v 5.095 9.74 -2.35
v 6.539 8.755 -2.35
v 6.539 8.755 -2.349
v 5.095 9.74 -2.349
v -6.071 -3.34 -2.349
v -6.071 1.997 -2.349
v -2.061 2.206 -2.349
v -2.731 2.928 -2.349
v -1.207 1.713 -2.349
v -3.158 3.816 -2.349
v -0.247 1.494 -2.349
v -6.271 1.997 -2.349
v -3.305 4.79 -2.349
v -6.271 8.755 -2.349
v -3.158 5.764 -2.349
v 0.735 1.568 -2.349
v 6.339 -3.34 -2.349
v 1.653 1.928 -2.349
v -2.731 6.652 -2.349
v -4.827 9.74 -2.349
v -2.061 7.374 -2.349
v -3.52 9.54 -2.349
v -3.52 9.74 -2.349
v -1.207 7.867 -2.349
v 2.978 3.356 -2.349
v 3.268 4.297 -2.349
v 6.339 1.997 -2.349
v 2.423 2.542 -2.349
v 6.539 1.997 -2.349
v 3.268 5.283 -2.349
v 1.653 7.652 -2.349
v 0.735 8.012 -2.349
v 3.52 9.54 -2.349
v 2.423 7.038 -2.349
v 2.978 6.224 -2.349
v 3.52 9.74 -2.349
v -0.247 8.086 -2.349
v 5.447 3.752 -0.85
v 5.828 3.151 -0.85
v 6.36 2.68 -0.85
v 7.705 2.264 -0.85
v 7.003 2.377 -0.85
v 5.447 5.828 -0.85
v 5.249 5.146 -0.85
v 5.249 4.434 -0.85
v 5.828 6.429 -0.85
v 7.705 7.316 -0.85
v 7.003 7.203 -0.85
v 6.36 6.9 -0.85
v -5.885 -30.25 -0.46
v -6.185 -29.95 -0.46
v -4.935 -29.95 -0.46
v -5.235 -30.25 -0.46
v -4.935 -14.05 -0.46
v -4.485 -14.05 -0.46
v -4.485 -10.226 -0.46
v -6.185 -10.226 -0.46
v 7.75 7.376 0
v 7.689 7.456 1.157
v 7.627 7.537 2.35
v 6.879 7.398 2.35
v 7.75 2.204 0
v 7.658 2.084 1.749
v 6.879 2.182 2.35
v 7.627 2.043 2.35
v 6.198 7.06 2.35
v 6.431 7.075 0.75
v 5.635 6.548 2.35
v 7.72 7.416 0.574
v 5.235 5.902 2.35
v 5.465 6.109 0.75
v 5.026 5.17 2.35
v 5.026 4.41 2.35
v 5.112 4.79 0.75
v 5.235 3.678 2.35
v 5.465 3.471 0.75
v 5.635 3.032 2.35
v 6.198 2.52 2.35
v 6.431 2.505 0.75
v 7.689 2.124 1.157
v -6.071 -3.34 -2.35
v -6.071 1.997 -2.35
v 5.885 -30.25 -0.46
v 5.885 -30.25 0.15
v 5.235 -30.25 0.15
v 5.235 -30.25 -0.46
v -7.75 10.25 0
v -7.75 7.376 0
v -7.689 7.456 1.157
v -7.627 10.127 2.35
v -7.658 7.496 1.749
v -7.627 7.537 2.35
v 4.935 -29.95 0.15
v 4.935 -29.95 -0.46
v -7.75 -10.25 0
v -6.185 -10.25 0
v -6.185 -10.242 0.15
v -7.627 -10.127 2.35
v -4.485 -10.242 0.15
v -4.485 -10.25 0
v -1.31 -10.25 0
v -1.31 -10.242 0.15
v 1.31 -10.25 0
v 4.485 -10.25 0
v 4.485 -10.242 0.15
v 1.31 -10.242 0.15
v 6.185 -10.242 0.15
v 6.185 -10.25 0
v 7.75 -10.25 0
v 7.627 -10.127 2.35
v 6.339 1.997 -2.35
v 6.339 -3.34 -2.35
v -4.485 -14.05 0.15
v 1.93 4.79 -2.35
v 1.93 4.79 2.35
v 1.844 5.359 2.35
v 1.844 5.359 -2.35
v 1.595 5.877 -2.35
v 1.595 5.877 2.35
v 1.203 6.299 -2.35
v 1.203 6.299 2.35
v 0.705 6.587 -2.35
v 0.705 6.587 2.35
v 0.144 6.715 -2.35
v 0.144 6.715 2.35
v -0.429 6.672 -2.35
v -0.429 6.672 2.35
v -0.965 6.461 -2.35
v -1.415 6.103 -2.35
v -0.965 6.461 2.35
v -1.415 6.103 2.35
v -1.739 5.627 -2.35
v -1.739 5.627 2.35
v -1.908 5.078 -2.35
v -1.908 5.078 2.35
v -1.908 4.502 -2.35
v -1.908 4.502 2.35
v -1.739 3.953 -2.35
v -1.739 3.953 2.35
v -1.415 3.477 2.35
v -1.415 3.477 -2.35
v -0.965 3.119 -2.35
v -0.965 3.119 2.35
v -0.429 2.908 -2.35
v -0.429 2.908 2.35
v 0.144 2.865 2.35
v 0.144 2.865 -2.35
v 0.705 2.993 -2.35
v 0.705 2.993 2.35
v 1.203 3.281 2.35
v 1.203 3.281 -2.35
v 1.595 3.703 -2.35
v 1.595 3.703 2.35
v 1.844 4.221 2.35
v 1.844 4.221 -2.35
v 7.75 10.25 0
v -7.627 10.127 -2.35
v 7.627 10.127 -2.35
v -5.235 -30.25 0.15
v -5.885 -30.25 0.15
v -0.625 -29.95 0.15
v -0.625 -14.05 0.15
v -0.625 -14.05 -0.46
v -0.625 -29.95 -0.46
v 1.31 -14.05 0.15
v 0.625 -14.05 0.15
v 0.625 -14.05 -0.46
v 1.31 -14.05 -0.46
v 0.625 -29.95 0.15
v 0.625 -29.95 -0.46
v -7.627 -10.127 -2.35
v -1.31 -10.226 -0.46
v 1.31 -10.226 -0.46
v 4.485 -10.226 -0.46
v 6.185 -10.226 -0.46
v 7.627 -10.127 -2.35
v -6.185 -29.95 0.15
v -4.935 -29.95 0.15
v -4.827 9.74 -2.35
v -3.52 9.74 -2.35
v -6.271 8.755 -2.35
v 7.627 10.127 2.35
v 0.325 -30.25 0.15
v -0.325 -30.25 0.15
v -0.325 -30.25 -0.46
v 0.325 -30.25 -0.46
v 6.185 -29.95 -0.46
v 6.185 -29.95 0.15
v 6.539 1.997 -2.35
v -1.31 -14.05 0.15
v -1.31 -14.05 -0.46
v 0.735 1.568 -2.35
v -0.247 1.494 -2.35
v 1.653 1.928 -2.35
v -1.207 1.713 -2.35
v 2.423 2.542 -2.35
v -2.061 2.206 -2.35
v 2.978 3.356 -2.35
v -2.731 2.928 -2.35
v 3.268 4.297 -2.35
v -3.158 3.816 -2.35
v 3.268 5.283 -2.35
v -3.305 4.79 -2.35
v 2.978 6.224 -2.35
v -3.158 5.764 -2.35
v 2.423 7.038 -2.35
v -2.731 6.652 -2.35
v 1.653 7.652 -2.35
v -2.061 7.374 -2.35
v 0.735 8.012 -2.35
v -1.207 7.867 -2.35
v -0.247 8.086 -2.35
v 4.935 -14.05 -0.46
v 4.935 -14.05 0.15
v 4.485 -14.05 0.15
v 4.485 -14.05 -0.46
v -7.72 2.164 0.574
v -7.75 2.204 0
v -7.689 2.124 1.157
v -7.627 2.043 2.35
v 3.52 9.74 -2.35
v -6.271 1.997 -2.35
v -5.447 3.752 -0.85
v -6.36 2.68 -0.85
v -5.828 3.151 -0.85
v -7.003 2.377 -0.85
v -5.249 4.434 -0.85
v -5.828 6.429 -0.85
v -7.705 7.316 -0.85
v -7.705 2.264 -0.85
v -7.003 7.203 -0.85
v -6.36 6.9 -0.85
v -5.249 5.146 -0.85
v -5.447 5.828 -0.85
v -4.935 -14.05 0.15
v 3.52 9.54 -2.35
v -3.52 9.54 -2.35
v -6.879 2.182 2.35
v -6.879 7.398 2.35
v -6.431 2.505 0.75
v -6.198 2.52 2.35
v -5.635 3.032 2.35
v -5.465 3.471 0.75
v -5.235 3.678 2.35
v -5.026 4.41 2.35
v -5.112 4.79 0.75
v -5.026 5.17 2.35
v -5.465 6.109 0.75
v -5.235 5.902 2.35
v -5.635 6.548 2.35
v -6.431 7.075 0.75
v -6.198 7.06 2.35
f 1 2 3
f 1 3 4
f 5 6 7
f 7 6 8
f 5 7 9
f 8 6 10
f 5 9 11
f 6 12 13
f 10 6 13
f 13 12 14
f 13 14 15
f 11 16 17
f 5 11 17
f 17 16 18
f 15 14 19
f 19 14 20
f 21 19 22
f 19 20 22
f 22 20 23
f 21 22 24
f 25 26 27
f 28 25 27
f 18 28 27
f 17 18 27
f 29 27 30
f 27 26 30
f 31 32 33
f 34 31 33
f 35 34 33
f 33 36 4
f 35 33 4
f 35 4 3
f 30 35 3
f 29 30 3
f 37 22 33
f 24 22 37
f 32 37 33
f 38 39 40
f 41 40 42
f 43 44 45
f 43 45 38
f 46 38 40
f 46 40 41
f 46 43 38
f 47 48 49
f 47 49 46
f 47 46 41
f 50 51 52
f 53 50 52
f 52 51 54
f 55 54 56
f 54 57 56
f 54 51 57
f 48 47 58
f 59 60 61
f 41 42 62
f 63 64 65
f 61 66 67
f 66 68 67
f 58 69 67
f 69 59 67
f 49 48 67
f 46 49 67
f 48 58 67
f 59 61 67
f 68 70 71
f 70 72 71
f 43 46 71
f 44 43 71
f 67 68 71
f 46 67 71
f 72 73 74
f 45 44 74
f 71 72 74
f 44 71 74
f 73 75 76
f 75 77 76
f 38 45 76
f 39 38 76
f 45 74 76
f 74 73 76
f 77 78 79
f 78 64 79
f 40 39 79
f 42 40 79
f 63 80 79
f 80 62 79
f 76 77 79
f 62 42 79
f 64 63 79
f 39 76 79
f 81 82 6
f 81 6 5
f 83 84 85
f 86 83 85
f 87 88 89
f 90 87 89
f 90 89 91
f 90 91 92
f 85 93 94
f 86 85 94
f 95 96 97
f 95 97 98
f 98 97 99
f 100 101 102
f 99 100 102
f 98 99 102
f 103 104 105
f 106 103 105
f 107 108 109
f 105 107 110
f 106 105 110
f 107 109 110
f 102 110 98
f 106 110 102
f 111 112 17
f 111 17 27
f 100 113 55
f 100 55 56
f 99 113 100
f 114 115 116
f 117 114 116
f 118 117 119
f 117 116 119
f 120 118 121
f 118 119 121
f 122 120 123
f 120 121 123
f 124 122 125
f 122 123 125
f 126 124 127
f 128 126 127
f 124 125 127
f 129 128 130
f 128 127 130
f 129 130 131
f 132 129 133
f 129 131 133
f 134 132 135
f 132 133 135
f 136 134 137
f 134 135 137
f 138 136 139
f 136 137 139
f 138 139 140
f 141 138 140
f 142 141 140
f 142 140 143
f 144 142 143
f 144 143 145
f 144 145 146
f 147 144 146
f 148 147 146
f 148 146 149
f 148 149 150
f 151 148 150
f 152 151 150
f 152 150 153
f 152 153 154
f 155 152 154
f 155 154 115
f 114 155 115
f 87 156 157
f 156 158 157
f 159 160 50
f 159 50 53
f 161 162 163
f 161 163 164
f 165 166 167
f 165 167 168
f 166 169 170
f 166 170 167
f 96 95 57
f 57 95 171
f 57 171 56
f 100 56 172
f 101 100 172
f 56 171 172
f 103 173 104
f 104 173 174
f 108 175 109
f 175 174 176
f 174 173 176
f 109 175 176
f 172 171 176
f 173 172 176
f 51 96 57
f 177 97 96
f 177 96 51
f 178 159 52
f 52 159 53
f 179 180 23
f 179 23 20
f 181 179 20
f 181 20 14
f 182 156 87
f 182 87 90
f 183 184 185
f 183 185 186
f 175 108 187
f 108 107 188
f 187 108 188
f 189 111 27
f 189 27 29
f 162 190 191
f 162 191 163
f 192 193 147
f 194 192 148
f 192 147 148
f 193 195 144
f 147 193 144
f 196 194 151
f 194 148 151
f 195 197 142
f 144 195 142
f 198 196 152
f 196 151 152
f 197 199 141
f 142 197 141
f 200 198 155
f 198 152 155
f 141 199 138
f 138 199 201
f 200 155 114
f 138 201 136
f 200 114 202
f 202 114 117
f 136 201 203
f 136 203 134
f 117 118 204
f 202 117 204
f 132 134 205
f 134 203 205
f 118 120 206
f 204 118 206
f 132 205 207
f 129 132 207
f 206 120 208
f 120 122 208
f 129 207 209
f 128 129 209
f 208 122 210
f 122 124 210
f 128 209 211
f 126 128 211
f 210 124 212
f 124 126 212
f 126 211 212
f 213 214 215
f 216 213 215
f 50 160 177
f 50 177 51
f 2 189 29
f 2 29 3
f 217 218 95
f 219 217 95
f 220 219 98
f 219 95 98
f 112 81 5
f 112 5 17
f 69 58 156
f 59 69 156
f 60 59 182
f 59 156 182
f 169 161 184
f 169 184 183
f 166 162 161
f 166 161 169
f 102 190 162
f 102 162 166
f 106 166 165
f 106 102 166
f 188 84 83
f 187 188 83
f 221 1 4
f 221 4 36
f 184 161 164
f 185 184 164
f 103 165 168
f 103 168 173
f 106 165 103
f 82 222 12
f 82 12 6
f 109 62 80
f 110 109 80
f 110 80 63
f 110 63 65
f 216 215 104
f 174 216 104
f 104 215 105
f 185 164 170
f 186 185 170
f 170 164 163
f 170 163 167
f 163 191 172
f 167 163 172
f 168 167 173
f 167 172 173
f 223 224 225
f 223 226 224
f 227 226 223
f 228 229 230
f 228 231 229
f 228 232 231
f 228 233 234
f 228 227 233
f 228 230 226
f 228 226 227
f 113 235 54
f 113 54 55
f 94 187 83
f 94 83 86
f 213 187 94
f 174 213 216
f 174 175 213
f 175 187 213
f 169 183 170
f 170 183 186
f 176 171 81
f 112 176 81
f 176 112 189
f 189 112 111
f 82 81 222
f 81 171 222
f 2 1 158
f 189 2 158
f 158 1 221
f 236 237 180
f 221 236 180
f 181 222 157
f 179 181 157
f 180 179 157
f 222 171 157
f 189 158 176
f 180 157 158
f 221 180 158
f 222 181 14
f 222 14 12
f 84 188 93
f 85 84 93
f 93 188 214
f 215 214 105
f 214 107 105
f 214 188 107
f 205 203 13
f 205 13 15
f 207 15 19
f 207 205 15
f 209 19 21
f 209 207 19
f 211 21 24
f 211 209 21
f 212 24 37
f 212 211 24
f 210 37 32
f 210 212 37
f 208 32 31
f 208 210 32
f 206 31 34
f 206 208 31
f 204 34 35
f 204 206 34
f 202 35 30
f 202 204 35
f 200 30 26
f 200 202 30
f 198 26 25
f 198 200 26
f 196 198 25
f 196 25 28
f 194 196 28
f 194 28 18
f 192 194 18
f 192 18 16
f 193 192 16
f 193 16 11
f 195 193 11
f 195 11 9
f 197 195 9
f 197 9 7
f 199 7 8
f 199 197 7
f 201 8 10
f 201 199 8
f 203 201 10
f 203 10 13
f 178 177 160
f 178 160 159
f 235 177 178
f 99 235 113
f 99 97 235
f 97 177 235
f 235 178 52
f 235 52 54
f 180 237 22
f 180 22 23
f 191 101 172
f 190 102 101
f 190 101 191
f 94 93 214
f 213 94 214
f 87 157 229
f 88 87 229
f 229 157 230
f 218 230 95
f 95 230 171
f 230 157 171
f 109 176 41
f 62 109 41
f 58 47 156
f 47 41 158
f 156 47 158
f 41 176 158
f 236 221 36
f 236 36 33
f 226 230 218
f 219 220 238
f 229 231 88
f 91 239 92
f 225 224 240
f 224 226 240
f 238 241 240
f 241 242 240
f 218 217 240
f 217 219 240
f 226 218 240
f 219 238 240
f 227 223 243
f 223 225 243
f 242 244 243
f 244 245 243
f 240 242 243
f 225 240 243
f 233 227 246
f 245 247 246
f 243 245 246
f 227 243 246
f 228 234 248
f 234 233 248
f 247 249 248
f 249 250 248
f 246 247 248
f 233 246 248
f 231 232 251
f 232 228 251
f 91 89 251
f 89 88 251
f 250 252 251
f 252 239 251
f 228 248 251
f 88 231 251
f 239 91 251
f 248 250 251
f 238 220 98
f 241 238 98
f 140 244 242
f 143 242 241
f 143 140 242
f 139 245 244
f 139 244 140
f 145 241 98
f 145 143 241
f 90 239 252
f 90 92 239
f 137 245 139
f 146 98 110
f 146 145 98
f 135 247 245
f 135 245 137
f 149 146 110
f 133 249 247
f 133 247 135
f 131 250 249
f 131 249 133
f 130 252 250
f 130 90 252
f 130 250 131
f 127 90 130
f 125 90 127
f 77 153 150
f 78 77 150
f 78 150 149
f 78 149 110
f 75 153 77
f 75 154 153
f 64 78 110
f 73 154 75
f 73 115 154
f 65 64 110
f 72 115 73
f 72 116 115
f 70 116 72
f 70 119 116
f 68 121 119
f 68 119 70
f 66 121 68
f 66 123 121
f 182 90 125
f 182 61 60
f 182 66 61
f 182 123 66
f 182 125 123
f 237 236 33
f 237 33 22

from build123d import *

# Parameters (mm, degrees)
SKETCH1_W                     = 15.500000000000002
SKETCH1_H                     = 20.5
BOSS_EXTRUDE1_DEPTH           = 2.35
BOSS_EXTRUDE1_TAPER           = 3.0000000000000067
BOSS_EXTRUDE1_OTHER_WAY_DEPTH = 2.35
BOSS_EXTRUDE1_OTHER_WAY_TAPER = 3.0000000000000067
SKETCH2_R                     = 1.9300000000000004
CUT_EXTRUDE1_DEPTH            = 14.682653417374864
SKETCH3_R                     = 2.7499999999999982
CUT_EXTRUDE2_DEPTH            = 3.2
CUT_EXTRUDE2_DRAFT            = -4.000000000000009
SKETCH3_R_2                   = 2.75
CUT_EXTRUDE2_PROFILE_2_DEPTH  = 3.2
CUT_EXTRUDE2_PROFILE_2_DRAFT  = -4.000000000000009
SKETCH4_R                     = 3.305
CUT_EXTRUDE3_DEPTH            = 0.001
BOSS_EXTRUDE2_DEPTH           = 0.61
CHAMFER1_SIZE                 = 0.3


with BuildPart() as part:
    # Sketch1 → Boss-Extrude1 (new body)
    with BuildSketch(Plane.XY):
        Rectangle(SKETCH1_W, SKETCH1_H)
    extrude(amount=BOSS_EXTRUDE1_DEPTH, taper=BOSS_EXTRUDE1_TAPER)

    # Sketch1 → Boss-Extrude1 other way (add)
    with BuildSketch(Plane.XY):
        Rectangle(SKETCH1_W, SKETCH1_H)
    extrude(amount=-BOSS_EXTRUDE1_OTHER_WAY_DEPTH, taper=BOSS_EXTRUDE1_OTHER_WAY_TAPER)

    # Sketch2 → Cut-Extrude1 (cut, through all)
    with BuildSketch(Plane.XY.offset(2.35)):
        with Locations((0, 4.790000000000001)):
            Circle(SKETCH2_R)
    extrude(amount=-CUT_EXTRUDE1_DEPTH, mode=Mode.SUBTRACT)


with BuildPart() as cut_extrude2_tool:
    # Sketch3 → Cut-Extrude2 (with draft: the straight prism first)
    with BuildSketch(Plane.XY.offset(2.35)):
        with Locations((7.75, 4.790000000000001)):
            Circle(SKETCH3_R)
    extrude(amount=-CUT_EXTRUDE2_DEPTH)
    # Cut-Extrude2: the draft: its side faces are tilted about the plane it starts from
    cut_extrude2_sides = [cut_extrude2_tool.faces().sort_by_distance(p)[0] for p in [
        (5, 4.79, 0.75),
    ]]
    draft(cut_extrude2_sides, Plane.XY.offset(2.35), CUT_EXTRUDE2_DRAFT)


with BuildPart() as part_1:
    add(part.part)

    # Cut-Extrude2: cut by cut_extrude2_tool
    add(cut_extrude2_tool.part, mode=Mode.SUBTRACT)


with BuildPart() as cut_extrude2_profile_2_tool:
    # Sketch3 → Cut-Extrude2 profile 2 (with draft: the straight prism first)
    with BuildSketch(Plane.XY.offset(2.35)):
        with Locations((-7.75, 4.790000000000001)):
            Circle(SKETCH3_R_2)
    extrude(amount=-CUT_EXTRUDE2_PROFILE_2_DEPTH)
    # Cut-Extrude2 profile 2: the draft: its side faces are tilted about the plane it starts from
    cut_extrude2_profile_2_sides = [cut_extrude2_profile_2_tool.faces().sort_by_distance(p)[0] for p in [
        (-10.5, 4.79, 0.75),
    ]]
    draft(cut_extrude2_profile_2_sides, Plane.XY.offset(2.35), CUT_EXTRUDE2_PROFILE_2_DRAFT)


with BuildPart() as part_2:
    add(part_1.part)

    # Cut-Extrude2 profile 2: cut by cut_extrude2_profile_2_tool
    add(cut_extrude2_profile_2_tool.part, mode=Mode.SUBTRACT)

    # Sketch4 → Cut-Extrude3 (cut)
    with BuildSketch(Plane(origin=(0, 0, -2.35), x_dir=(-1, 0, 0), z_dir=(0, 0, -1))):
        Polygon((-6.539115869693152, 8.755028571929065), (-5.095312145144818, 9.74), (-3.520299832613913, 9.74), (-3.520299832613913, 9.540000000000001), (3.520299832613913, 9.540000000000001), (3.520299832613913, 9.74), (4.827080405758514, 9.74), (6.2708841303068485, 8.755028571929065), (6.270884130306849, 1.9970301626645939), (6.07088413030685, 1.9970301626645939), (6.070884130306851, -3.3399999999999994), (-6.339115869693153, -3.3400000000000007), (-6.339115869693152, 1.9970301626645925), (-6.539115869693152, 1.997030162664592), align=None)
        with Locations((0, 4.790000000000001)):
            Circle(SKETCH4_R, mode=Mode.SUBTRACT)
    extrude(amount=-CUT_EXTRUDE3_DEPTH, mode=Mode.SUBTRACT)

    # Sketch6 → Boss-Extrude2 (add)
    with BuildSketch(Plane(origin=(0, 0, 0.14999999999999997), x_dir=(-1, 0, 0), z_dir=(0, 0, -1))):
        Polygon((-6.1850000000000005, -10.126841718684854), (-6.184999999999995, -30.249999999999993), (-4.934999999999998, -30.249999999999993), (-4.934999999999998, -14.049999999999999), (-4.484999999999999, -14.049999999999999), (-4.485, -10.126841718684854), align=None)
        Polygon((4.485000000000002, -10.126841718684853), (6.185000000000002, -10.126841718684853), (6.185000000000002, -30.249999999999993), (4.935000000000004, -30.249999999999993), (4.935000000000001, -14.049999999999997), (4.485000000000003, -14.049999999999997), align=None)
        Polygon((-1.3099999999999987, -10.126841718684854), (1.3100000000000005, -10.126841718684854), (1.3100000000000016, -14.05), (0.6250000000000014, -14.05), (0.6250000000000027, -30.249999999999993), (-0.624999999999995, -30.249999999999993), (-0.6249999999999972, -14.049999999999999), (-1.3099999999999983, -14.049999999999999), align=None)
    extrude(amount=BOSS_EXTRUDE2_DEPTH)

    # Chamfer1
    chamfer1_edges = [part_2.edges().sort_by_distance(p)[0] for p in [
        (6.184999999999995, -30.249999999999993, -0.15500000000000003),
        (4.934999999999998, -30.249999999999993, -0.15500000000000003),
        (-4.935000000000004, -30.249999999999993, -0.15500000000000003),
        (-6.185000000000002, -30.249999999999993, -0.15500000000000003),
        (0.624999999999995, -30.249999999999993, -0.15500000000000003),
        (-0.6250000000000027, -30.249999999999993, -0.15500000000000003),
    ]]
    chamfer(chamfer1_edges, length=CHAMFER1_SIZE)


solid = part_2.part
